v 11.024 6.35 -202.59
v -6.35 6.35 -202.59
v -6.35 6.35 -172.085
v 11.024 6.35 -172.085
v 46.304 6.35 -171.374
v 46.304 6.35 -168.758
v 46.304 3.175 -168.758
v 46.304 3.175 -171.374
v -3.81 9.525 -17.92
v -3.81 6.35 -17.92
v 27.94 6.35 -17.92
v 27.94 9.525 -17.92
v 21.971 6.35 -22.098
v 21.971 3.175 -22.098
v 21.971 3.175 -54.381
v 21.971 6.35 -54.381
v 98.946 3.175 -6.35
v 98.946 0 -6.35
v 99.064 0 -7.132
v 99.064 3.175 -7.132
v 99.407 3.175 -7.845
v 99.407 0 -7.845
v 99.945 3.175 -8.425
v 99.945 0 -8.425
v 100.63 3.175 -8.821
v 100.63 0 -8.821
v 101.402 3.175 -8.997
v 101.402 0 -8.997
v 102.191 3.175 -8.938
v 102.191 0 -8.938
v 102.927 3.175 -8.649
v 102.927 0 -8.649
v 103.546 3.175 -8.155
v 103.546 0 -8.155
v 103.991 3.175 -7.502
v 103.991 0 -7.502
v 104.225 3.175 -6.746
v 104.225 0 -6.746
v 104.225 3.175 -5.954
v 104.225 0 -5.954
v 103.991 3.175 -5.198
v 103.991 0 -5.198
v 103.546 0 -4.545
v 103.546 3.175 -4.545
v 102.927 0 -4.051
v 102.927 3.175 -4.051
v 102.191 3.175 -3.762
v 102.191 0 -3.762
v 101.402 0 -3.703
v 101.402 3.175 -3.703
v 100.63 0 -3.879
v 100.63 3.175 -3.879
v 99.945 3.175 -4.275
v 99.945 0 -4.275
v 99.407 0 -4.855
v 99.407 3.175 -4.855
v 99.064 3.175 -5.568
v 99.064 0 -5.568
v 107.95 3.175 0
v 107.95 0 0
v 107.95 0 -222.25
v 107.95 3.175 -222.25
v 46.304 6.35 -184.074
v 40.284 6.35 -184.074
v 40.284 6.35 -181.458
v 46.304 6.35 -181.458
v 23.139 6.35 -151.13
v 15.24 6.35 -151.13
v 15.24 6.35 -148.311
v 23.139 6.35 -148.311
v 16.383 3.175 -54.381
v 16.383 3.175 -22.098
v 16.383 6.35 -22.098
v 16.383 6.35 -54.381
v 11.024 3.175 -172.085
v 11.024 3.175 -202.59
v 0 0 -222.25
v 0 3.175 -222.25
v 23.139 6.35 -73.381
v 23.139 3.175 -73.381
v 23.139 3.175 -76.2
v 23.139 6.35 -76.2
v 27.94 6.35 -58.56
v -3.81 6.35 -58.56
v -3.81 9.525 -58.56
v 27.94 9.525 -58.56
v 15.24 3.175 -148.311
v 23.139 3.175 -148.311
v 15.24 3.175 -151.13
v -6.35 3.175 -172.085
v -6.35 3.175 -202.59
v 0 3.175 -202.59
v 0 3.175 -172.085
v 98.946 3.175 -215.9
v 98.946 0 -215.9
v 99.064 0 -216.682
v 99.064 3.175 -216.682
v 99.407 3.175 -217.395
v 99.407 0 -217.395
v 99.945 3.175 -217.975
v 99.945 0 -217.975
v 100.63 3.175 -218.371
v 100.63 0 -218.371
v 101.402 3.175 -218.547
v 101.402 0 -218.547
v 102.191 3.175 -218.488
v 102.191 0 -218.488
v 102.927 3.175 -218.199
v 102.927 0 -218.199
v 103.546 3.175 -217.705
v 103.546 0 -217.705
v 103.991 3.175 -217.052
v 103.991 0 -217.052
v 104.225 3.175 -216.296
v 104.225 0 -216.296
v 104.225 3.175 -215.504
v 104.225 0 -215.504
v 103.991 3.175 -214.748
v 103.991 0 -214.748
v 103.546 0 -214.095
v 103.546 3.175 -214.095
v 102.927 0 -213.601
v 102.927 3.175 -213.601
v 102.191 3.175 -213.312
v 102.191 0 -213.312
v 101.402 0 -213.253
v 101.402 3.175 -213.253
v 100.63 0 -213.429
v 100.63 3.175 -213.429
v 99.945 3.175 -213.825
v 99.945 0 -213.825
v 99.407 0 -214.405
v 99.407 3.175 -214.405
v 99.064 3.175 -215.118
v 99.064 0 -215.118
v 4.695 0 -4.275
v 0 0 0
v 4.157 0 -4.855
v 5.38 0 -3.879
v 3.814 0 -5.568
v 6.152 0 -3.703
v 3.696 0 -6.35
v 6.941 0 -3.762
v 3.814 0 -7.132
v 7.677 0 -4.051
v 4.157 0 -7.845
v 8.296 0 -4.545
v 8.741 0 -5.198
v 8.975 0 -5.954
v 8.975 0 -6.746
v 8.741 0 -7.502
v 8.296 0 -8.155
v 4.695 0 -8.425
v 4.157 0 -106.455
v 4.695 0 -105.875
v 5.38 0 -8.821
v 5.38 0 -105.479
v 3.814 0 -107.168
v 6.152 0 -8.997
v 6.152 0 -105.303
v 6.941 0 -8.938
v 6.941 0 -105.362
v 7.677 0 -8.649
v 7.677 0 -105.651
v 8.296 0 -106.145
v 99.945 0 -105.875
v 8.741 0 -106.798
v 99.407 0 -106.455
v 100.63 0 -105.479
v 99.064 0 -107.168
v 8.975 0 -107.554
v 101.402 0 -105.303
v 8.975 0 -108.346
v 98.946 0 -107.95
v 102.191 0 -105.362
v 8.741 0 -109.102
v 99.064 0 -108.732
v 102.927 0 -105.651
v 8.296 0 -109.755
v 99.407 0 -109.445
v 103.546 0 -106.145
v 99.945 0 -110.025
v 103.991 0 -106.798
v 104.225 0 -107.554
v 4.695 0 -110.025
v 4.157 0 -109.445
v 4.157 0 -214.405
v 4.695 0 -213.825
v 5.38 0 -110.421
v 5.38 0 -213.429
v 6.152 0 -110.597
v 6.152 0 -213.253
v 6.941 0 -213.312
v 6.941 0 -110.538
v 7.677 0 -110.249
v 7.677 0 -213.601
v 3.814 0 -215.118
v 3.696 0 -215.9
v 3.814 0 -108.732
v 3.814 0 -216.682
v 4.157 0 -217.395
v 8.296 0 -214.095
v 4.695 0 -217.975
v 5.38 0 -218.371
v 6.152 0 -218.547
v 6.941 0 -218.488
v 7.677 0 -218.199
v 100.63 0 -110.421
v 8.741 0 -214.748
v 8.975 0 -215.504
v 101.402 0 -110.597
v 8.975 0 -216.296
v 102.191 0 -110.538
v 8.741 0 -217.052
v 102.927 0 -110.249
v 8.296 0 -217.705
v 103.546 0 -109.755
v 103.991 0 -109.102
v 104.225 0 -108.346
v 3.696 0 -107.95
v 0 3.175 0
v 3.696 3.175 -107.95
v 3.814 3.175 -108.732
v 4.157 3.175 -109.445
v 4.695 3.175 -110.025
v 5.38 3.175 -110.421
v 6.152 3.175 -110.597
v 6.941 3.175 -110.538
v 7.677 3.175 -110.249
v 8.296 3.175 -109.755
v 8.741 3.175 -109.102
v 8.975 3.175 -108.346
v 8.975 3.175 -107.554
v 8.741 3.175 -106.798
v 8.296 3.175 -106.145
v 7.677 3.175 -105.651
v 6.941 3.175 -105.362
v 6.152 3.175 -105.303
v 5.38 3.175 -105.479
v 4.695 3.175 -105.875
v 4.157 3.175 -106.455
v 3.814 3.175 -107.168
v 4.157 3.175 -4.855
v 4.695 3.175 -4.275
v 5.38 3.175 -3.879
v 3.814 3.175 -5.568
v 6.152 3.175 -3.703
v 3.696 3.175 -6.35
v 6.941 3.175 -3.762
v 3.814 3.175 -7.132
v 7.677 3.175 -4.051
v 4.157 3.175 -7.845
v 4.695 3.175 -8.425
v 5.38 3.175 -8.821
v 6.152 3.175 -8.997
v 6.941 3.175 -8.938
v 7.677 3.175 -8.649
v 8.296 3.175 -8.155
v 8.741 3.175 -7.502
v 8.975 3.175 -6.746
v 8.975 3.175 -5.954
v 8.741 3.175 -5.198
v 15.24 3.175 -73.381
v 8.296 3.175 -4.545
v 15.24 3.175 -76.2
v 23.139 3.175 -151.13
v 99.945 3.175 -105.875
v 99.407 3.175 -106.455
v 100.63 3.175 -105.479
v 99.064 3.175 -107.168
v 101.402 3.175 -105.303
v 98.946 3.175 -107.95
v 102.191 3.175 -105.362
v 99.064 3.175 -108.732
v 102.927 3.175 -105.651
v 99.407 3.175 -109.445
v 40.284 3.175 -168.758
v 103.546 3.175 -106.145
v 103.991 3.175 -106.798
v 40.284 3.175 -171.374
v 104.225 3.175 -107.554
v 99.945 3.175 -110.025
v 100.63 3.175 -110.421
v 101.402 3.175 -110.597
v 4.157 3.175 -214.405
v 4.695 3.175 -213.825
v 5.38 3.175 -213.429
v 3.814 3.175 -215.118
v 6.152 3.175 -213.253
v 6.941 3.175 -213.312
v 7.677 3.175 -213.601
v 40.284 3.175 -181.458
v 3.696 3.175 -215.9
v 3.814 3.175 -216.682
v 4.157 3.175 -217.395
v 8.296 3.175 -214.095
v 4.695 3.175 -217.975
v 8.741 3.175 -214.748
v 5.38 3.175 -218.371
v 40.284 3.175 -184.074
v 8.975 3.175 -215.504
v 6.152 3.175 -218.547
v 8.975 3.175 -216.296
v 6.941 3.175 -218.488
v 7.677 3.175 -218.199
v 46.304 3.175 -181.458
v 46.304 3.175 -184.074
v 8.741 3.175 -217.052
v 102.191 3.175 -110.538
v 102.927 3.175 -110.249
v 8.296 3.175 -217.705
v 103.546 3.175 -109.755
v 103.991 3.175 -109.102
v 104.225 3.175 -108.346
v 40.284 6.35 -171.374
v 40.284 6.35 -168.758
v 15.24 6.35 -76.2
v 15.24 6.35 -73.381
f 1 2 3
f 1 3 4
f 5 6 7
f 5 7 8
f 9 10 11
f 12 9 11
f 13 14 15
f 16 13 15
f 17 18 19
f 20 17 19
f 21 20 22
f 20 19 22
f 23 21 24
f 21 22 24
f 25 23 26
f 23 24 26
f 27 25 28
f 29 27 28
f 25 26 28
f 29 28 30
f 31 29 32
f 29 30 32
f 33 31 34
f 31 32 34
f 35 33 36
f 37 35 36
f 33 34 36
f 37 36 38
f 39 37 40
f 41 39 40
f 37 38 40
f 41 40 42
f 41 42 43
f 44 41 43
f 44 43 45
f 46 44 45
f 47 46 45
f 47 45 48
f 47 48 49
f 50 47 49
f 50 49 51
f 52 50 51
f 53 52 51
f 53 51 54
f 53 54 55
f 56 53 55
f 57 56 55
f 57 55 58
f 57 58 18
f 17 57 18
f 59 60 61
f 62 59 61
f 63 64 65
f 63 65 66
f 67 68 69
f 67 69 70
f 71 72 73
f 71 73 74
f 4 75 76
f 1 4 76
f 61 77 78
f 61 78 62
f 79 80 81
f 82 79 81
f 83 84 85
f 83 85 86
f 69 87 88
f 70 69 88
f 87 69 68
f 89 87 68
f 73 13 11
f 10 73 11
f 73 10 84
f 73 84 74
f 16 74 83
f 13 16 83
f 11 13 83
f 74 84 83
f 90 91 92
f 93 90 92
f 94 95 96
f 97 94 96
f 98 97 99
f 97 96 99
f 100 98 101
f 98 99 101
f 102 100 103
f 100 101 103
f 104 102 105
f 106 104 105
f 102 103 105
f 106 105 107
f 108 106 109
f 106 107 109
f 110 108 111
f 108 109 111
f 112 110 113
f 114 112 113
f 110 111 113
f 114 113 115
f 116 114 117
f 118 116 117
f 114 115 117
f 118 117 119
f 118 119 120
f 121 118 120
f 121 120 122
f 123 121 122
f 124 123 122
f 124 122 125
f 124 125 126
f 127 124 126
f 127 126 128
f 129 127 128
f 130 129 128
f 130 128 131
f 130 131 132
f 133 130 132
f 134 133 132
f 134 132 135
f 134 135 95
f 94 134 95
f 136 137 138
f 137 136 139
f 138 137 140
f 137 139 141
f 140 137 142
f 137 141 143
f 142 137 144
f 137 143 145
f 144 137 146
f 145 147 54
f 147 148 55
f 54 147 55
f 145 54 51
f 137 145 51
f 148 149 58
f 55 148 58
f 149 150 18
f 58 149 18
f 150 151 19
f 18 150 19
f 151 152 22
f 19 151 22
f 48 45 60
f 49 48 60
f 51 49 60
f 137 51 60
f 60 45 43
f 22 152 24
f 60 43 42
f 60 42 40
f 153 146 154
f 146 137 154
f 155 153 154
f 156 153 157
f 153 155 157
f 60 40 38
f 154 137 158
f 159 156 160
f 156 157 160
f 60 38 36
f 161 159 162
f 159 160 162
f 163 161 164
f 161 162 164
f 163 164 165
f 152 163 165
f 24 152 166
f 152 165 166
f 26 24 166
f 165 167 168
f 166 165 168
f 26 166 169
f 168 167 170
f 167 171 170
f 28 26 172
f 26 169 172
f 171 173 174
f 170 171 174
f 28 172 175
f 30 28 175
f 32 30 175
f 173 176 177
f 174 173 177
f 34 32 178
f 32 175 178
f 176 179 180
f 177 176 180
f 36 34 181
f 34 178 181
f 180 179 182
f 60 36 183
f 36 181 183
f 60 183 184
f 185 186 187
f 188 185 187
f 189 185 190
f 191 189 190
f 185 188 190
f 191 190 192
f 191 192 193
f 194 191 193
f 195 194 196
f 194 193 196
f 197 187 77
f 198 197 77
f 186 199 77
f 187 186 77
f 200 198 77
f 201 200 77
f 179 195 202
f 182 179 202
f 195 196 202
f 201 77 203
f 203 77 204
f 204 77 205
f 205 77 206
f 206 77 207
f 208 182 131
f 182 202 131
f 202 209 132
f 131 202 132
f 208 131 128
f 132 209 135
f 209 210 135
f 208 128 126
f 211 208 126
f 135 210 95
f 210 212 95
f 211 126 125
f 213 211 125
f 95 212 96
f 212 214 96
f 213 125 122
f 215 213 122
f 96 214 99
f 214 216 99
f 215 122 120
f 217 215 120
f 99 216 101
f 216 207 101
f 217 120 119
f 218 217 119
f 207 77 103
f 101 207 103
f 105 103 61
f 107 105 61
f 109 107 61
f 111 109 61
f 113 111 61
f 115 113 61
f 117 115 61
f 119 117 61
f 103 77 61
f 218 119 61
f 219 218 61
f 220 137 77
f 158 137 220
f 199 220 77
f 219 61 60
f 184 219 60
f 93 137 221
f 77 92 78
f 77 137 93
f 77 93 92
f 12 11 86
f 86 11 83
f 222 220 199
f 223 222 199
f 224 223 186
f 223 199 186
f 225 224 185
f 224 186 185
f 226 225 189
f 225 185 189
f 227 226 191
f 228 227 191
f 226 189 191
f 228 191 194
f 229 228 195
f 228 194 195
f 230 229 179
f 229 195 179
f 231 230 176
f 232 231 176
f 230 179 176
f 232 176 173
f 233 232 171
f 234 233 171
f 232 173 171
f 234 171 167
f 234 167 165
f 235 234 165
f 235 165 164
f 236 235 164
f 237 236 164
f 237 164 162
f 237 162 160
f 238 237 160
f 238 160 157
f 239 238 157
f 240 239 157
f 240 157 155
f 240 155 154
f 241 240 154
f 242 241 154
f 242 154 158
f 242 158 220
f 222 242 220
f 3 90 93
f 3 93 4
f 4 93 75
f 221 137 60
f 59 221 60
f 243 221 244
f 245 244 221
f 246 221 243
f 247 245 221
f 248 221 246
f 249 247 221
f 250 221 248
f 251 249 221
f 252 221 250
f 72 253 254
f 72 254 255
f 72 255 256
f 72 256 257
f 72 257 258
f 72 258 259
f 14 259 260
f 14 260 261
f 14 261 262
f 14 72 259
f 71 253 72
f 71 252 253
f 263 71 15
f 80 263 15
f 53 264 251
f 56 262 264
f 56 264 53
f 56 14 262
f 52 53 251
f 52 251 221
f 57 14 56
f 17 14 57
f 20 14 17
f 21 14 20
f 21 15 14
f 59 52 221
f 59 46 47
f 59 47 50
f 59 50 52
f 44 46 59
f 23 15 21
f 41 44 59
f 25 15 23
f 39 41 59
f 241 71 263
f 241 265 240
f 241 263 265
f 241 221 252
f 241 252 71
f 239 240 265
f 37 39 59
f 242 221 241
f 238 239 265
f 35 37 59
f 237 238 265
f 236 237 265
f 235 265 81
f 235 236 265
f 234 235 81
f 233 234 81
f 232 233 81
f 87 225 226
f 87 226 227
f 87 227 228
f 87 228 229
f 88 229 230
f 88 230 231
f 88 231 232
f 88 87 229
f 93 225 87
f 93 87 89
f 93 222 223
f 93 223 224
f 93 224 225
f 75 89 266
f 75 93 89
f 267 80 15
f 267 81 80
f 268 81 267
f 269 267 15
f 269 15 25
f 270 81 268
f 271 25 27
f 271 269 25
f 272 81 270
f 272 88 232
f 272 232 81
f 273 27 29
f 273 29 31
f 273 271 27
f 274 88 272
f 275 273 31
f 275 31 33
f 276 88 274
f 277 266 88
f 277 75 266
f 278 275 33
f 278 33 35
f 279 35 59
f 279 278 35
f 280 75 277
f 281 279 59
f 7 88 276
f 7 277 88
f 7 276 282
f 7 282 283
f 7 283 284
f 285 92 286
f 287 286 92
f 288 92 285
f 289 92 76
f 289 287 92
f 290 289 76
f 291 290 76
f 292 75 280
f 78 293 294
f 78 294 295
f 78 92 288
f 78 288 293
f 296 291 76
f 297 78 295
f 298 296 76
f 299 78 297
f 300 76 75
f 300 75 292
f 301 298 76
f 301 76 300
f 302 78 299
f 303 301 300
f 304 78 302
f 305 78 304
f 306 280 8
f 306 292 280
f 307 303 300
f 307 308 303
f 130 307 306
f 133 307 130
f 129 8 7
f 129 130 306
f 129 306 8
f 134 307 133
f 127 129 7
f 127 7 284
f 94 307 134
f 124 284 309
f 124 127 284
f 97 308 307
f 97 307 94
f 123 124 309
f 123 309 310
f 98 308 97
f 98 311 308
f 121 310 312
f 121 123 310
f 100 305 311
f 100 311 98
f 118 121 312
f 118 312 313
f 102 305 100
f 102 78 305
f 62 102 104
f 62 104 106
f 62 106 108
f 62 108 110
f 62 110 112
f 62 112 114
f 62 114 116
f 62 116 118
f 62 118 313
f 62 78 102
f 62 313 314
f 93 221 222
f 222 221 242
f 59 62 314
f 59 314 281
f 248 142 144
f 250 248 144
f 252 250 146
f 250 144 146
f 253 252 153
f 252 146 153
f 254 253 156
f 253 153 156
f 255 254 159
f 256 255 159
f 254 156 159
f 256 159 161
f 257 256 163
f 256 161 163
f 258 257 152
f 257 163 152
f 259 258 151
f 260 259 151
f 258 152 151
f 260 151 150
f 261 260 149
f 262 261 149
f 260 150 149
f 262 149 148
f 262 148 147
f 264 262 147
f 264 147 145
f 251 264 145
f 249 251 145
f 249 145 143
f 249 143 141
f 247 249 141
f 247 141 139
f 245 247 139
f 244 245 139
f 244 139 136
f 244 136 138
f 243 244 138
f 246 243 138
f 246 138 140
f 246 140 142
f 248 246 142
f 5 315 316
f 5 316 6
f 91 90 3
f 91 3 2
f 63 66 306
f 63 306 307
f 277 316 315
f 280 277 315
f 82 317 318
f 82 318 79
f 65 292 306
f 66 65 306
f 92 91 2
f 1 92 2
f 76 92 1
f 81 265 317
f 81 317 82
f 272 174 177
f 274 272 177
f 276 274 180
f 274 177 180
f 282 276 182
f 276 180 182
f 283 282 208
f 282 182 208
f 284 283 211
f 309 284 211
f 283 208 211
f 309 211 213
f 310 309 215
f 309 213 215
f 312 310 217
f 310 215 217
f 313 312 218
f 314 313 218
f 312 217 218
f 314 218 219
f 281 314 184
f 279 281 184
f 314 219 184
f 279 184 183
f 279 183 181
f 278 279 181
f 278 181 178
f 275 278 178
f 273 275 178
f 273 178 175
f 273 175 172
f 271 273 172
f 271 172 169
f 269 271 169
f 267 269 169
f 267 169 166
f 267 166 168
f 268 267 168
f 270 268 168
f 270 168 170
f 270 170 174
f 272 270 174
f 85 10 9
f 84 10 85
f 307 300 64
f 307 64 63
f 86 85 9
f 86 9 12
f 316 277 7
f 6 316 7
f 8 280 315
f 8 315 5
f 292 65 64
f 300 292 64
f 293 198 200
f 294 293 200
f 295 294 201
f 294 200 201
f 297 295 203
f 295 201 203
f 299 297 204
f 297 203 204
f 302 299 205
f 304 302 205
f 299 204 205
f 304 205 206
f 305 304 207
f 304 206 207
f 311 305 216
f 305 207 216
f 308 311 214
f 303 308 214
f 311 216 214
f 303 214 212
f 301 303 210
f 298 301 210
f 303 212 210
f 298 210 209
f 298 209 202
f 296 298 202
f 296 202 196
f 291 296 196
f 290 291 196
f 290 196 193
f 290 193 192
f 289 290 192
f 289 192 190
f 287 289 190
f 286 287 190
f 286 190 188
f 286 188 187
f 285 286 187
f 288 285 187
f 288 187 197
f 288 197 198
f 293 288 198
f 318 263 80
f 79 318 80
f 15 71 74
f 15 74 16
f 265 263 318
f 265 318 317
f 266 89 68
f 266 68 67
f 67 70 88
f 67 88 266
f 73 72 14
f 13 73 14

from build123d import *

# Parameters (mm, degrees)
SKETCH1_W                  = 107.95
SKETCH1_H                  = 222.25
BOSS_EXTRUDE1_DEPTH        = 3.175
SKETCH3_W                  = 17.3736
SKETCH3_H                  = 30.5054
SKETCH3_W_2                = 7.8994
SKETCH3_H_2                = 2.8194
SKETCH3_W_3                = 5.588
SKETCH3_H_3                = 32.2834
SKETCH3_W_4                = 6.0198
SKETCH3_H_4                = 2.6162
BOSS_EXTRUDE2_DEPTH        = 3.175
F_4_0_209_DIAMETER_HOLE1_D = 5.3086
SKETCH7_W                  = 31.75
SKETCH7_H                  = 40.64
BOSS_EXTRUDE3_DEPTH        = 3.175


with BuildPart() as part:
    # Sketch1 → Boss-Extrude1 (new body)
    with BuildSketch(Plane(origin=(0, 0, 0), x_dir=(1, 0, 0), z_dir=(0, 1, 0))):
        with Locations((53.975, 111.125)):
            Rectangle(SKETCH1_W, SKETCH1_H)
    extrude(amount=BOSS_EXTRUDE1_DEPTH)

    # Sketch3 → Boss-Extrude2 (add)
    with BuildSketch(Plane(origin=(0, 3.175, 0), x_dir=(1, 0, 0), z_dir=(0, 1, 0))):
        with Locations((2.3368, 187.3377)):
            Rectangle(SKETCH3_W, SKETCH3_H)
        with Locations((19.1897, 149.7203)):
            Rectangle(SKETCH3_W_2, SKETCH3_H_2)
        with Locations((19.1897, 74.7903)):
            Rectangle(SKETCH3_W_2, SKETCH3_H_2)
        with Locations((19.177, 38.2397)):
            Rectangle(SKETCH3_W_3, SKETCH3_H_3)
        with Locations((43.2943, 182.7657)):
            Rectangle(SKETCH3_W_4, SKETCH3_H_4)
        with Locations((43.2943, 170.0657)):
            Rectangle(SKETCH3_W_4, SKETCH3_H_4)
    extrude(amount=BOSS_EXTRUDE2_DEPTH)

    # #4 (0.209) Diameter Hole1 (through all)
    with Locations(Plane(origin=(0, 3.175, 0), x_dir=(1, 0, 0), z_dir=(0, 1, 0))):
        with Locations((101.6, 215.9), (101.6, 6.35), (6.35, 6.35), (6.35, 215.9), (6.35, 107.95), (101.6, 107.95)):
            Hole(F_4_0_209_DIAMETER_HOLE1_D / 2)

    # Sketch7 → Boss-Extrude3 (add)
    with BuildSketch(Plane(origin=(0, 6.35, 0), x_dir=(1, 0, 0), z_dir=(0, 1, 0))):
        with Locations((12.065, 38.2397)):
            Rectangle(SKETCH7_W, SKETCH7_H)
    extrude(amount=BOSS_EXTRUDE3_DEPTH)


solid = part.part
